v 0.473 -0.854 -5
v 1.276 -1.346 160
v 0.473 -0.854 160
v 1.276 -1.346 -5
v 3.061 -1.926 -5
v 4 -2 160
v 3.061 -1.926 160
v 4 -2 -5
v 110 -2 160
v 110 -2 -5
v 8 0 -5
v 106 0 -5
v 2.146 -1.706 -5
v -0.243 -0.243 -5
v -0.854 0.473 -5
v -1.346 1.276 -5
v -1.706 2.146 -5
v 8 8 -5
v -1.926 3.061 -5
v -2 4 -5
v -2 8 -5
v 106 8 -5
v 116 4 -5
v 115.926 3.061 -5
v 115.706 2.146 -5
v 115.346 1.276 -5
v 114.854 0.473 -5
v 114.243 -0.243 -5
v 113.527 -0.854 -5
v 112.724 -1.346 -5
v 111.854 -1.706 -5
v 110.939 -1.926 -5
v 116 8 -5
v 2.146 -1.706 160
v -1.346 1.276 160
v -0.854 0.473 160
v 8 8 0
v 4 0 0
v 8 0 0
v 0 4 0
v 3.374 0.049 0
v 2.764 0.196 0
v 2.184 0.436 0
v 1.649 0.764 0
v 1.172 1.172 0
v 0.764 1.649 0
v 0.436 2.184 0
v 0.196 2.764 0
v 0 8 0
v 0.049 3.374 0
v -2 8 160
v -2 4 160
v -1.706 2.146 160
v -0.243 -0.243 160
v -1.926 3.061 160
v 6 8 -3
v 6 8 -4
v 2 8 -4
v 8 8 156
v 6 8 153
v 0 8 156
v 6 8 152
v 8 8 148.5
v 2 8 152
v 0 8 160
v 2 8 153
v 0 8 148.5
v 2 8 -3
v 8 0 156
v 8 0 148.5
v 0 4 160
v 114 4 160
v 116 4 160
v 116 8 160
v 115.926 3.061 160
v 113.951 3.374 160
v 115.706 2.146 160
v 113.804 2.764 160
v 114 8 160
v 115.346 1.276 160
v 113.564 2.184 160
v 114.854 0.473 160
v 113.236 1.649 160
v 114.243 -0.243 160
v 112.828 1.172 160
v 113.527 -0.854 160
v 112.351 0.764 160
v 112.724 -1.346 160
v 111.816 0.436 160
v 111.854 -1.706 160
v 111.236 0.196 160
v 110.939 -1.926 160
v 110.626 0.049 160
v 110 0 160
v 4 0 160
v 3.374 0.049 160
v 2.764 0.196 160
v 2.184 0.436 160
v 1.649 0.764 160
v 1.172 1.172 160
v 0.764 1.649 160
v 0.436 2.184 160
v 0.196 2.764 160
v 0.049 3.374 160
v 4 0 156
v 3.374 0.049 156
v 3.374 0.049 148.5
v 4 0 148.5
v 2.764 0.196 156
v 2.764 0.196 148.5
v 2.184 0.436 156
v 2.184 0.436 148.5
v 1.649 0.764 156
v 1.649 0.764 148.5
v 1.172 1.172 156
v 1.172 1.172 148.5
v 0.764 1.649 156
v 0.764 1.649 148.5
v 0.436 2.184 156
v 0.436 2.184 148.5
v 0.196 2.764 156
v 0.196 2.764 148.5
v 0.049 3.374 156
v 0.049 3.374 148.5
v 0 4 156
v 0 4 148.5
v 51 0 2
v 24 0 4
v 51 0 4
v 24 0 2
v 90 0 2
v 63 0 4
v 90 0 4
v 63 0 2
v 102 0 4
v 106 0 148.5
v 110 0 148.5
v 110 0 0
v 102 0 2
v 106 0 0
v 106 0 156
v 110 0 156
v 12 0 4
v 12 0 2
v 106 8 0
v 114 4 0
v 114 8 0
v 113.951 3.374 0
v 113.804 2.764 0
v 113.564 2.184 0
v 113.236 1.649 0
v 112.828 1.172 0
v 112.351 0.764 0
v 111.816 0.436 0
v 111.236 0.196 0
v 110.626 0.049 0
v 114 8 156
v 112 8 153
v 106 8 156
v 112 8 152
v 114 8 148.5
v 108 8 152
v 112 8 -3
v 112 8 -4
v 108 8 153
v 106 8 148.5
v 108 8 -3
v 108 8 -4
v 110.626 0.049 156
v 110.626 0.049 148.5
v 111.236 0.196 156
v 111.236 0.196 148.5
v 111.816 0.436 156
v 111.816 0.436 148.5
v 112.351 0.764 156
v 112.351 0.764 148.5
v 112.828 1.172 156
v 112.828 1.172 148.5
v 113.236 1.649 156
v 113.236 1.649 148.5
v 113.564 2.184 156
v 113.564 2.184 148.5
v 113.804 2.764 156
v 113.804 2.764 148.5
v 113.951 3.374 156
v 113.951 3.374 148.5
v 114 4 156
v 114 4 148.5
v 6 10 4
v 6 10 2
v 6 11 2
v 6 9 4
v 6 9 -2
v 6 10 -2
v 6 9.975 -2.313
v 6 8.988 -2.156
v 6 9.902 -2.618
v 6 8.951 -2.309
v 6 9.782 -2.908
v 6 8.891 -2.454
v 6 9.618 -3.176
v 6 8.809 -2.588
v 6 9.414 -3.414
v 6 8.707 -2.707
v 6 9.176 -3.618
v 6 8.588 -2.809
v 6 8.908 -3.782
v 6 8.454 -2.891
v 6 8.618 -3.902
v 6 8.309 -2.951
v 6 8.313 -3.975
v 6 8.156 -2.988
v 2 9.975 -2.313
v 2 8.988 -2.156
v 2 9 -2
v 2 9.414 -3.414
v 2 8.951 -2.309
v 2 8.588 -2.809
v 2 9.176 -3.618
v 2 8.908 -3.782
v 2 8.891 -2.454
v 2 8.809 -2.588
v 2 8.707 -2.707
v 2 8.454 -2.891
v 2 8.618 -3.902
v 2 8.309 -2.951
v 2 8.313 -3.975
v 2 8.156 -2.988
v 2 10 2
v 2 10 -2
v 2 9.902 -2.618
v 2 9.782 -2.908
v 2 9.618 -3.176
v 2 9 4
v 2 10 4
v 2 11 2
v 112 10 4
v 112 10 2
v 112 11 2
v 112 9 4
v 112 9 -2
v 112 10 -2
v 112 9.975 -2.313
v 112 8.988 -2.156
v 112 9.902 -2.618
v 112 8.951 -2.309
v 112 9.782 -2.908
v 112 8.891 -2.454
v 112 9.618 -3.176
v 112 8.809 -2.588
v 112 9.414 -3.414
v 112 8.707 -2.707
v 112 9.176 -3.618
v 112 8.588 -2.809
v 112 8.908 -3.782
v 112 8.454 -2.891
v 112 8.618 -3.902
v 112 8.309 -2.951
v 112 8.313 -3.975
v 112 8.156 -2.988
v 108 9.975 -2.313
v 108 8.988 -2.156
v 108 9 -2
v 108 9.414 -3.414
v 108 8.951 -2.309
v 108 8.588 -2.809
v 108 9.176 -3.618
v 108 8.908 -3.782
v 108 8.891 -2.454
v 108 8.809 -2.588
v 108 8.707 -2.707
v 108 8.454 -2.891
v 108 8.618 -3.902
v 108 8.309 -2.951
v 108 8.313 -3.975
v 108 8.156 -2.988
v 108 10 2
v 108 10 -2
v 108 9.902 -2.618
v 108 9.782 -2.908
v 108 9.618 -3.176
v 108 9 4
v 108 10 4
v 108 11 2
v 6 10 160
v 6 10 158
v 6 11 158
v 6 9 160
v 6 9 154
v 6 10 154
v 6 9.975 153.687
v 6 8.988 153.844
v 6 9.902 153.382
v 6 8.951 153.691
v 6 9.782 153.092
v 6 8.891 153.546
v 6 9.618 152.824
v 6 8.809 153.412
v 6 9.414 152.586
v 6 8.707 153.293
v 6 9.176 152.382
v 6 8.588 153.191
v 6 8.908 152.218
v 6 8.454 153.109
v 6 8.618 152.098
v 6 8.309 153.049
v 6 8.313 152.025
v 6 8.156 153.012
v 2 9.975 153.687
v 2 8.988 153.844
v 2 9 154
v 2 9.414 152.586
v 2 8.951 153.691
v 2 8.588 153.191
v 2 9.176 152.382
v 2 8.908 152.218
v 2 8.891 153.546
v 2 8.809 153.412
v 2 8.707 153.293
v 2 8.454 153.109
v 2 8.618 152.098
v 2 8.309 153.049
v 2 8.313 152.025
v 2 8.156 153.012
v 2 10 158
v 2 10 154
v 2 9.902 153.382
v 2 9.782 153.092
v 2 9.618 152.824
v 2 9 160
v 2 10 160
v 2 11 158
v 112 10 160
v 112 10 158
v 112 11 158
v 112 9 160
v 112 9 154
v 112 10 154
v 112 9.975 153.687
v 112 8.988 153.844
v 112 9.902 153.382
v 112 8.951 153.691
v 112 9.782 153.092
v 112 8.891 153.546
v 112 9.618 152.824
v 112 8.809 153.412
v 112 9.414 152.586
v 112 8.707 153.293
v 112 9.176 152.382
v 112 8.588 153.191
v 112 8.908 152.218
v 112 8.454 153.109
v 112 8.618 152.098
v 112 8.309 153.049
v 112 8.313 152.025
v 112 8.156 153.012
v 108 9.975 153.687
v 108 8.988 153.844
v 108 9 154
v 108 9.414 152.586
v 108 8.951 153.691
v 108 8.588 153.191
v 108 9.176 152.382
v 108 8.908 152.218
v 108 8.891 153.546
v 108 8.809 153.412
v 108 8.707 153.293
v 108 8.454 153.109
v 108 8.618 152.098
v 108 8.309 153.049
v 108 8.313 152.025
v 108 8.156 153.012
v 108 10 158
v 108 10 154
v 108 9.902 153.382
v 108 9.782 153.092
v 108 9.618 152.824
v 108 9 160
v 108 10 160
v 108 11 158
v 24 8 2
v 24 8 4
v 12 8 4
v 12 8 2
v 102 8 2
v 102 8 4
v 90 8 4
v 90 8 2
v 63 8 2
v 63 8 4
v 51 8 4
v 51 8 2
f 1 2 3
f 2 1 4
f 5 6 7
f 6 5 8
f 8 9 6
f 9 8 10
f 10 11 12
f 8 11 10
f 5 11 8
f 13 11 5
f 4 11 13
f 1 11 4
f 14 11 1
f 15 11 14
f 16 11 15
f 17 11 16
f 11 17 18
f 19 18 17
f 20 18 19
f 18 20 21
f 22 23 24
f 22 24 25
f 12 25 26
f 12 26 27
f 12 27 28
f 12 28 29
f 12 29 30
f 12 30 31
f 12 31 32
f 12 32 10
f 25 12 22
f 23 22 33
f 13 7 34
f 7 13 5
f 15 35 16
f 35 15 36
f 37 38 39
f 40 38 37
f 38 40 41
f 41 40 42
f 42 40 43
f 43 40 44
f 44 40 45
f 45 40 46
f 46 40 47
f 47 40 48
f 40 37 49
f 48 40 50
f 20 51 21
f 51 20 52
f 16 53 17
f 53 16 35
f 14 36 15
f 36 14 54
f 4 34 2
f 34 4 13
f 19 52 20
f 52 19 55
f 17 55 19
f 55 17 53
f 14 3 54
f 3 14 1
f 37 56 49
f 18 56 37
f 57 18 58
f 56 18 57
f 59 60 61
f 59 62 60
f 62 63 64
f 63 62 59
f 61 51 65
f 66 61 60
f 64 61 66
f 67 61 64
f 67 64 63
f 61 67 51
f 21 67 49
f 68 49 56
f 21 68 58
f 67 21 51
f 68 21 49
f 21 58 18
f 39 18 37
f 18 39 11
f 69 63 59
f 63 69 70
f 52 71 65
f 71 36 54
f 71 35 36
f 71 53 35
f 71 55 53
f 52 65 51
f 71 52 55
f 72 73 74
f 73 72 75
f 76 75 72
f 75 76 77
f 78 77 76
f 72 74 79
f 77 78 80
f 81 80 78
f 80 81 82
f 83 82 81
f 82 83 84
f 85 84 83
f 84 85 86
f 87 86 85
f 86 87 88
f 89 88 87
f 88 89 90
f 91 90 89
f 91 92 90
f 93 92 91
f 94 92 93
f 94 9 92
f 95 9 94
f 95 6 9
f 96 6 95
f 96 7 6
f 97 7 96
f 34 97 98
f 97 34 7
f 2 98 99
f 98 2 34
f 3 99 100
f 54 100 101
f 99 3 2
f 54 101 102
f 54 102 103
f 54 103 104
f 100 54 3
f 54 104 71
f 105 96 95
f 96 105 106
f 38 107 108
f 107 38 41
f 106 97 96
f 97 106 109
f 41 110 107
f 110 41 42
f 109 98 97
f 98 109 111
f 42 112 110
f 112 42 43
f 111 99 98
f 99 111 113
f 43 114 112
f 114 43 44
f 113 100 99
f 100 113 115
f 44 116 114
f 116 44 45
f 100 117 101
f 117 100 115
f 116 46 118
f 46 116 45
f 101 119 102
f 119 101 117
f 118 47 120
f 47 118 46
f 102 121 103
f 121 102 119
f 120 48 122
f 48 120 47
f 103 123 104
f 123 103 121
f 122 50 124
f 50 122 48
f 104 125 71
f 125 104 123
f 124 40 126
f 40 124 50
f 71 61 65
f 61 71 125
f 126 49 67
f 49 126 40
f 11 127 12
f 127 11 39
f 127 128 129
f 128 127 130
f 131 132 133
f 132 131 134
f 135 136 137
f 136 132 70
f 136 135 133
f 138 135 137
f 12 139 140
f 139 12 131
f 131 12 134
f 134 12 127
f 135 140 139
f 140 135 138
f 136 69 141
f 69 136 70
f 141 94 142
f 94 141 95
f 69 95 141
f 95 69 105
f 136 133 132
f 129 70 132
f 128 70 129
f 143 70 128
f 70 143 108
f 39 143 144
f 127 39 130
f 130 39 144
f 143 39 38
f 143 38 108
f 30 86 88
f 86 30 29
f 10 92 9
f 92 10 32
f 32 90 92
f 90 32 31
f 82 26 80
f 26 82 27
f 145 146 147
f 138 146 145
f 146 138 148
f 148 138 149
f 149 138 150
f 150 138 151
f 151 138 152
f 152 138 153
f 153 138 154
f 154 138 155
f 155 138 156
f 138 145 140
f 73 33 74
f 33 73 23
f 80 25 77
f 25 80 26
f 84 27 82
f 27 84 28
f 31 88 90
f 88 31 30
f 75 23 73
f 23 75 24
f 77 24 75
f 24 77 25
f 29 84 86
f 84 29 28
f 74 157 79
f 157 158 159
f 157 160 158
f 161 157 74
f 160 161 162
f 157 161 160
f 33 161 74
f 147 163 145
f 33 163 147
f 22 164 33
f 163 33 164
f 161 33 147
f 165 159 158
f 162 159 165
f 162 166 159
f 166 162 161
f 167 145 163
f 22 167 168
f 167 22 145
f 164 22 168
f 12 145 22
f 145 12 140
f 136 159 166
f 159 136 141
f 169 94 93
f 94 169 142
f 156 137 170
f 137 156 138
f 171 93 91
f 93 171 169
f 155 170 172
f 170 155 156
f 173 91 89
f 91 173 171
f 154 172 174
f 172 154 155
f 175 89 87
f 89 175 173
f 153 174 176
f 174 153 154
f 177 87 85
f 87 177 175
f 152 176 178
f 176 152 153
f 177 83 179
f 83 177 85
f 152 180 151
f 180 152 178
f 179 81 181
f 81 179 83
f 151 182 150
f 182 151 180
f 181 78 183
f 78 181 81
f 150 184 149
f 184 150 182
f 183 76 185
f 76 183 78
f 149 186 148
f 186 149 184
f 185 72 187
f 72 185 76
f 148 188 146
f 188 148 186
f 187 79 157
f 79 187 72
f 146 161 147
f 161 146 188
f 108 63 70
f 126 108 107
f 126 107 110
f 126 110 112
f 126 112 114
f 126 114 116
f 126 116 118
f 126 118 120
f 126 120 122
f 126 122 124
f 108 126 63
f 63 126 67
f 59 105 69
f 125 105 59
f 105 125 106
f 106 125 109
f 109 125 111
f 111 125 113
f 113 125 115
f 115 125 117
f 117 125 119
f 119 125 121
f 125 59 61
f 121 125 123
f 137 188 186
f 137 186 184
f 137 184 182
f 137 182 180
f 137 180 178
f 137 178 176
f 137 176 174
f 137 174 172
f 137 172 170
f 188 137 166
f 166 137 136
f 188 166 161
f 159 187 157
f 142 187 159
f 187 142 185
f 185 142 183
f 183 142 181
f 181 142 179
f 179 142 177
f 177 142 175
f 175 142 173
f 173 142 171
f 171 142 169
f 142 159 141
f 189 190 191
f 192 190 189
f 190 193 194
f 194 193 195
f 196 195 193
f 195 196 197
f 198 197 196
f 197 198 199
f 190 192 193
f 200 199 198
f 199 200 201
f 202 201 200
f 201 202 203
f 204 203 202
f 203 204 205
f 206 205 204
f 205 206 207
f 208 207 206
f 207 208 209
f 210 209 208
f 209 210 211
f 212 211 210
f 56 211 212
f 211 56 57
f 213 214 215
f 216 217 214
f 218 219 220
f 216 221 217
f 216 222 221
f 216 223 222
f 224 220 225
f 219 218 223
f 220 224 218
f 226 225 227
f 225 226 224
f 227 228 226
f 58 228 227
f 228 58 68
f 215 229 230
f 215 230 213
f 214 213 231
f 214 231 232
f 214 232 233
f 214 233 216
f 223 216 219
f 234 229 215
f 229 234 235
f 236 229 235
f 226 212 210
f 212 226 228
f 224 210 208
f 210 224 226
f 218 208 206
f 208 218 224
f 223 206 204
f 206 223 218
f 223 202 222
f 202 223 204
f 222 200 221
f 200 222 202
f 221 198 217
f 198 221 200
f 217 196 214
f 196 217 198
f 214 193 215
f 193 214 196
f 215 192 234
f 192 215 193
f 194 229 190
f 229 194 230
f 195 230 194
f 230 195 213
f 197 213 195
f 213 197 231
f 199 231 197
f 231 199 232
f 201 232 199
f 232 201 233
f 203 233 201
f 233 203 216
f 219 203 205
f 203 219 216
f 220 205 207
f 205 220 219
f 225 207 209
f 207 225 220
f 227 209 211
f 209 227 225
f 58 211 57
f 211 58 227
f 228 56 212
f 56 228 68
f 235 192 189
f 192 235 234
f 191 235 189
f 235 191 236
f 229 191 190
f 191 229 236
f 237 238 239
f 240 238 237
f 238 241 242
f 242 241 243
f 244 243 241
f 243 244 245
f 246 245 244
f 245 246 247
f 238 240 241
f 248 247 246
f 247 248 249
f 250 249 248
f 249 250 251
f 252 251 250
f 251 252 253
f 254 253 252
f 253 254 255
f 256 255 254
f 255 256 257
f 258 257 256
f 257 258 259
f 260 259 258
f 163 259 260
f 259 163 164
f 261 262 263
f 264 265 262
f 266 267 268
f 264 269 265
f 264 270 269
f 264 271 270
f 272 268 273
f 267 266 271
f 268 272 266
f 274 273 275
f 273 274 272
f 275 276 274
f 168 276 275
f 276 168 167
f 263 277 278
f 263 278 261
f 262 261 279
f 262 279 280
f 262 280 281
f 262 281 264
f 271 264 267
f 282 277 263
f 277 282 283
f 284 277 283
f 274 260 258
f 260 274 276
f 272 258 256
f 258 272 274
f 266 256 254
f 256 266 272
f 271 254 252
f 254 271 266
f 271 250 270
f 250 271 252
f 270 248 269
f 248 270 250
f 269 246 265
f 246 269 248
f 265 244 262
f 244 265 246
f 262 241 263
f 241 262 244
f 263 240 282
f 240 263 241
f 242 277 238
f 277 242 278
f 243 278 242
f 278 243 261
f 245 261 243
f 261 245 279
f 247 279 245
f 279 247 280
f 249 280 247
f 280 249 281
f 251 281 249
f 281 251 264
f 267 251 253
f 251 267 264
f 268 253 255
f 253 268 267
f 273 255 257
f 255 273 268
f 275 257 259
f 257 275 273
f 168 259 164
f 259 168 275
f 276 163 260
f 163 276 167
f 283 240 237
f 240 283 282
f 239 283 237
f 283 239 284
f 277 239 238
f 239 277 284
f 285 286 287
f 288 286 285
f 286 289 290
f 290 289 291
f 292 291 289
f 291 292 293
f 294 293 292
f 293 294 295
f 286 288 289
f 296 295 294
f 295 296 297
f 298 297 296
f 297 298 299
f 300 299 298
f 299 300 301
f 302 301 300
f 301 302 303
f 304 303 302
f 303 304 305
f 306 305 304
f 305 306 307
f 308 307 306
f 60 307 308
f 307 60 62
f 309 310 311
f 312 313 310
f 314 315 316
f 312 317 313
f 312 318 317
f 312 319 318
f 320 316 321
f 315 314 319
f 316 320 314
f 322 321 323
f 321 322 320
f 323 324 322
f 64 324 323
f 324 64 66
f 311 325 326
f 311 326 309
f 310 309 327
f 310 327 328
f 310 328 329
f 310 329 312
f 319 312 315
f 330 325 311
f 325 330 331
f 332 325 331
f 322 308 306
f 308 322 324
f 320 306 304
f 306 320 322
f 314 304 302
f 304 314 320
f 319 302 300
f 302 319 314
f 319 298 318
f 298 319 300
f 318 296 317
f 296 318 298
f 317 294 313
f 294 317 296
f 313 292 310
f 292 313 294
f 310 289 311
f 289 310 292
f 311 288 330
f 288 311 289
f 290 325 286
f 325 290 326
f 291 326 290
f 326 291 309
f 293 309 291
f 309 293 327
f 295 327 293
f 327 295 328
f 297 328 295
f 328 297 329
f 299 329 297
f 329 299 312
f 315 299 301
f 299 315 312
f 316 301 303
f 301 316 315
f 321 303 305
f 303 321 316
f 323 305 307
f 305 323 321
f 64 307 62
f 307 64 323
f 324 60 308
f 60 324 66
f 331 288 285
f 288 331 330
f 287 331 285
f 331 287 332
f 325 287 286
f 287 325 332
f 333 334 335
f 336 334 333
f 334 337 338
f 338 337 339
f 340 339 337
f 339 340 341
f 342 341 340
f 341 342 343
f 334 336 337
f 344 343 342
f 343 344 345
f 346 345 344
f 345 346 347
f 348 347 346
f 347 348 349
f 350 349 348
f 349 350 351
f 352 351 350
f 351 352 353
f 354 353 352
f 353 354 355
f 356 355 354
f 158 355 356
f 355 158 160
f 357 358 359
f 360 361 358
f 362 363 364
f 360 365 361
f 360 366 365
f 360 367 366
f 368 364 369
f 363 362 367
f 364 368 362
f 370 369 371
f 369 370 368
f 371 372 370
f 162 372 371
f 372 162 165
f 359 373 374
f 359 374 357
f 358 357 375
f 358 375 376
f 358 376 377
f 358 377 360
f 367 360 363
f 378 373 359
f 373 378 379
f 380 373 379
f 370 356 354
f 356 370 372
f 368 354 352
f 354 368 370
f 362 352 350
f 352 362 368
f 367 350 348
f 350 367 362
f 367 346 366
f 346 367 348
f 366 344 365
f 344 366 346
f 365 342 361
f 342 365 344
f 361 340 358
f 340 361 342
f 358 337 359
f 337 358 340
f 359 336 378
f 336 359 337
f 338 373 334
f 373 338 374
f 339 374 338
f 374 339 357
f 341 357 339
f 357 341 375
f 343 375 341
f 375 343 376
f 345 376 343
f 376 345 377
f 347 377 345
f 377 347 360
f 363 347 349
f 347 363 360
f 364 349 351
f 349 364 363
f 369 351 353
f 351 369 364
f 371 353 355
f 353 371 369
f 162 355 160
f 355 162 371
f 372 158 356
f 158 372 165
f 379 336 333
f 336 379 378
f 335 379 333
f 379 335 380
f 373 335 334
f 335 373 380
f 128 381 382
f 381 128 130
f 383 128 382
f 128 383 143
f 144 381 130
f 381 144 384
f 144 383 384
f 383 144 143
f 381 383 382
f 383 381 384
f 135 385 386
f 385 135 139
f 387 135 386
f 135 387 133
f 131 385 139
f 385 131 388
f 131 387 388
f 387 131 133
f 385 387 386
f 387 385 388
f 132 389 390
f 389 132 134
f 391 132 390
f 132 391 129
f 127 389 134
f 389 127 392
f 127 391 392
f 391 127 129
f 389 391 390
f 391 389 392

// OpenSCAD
$fn=40;
front_panel();
//corner(solid=false);

module front_panel(box_width=114, box_depth=220, box_height=160, t=2, r=4)
{
    // Global parameters
    stand_h = 5;
    bottom_lock_w = 12;
    
    // Bottom stands
    translate([r,r,-stand_h]) {
        corner(h=stand_h);
        corner(h=stand_h+box_height,solid=false);
    }
    translate([box_width-r,r,-stand_h]) mirror([1,0,0]) {
        corner(h=stand_h);
        corner(h=stand_h+box_height,solid=false);
    }

    // Bottom locks
    translate([3*r,0,t]) cube([bottom_lock_w, 2*r, t]);
    translate([box_width-bottom_lock_w-3*r,0,t]) cube([bottom_lock_w, 2*r, t]);
    translate([(box_width-bottom_lock_w)/2,0,t]) cube([bottom_lock_w, 2*r, t]);


    // Top blocks
    translate([r,r,box_height-2*t-1.5*stand_h]) corner(h=1.5*stand_h);
    translate([box_width-r,r,box_height-2*t-1.5*stand_h])mirror([1,0,0]) corner(h=1.5*stand_h);
    translate([r,-t,-stand_h])cube([box_width-2*r,t,box_height+stand_h]);
    
    // Snap-in
    snap_h = 8;
    translate([r,2*r,-snap_h+2*t]) snap_in(h=snap_h);
    translate([box_width-r,2*r,-snap_h+2*t]) snap_in(h=snap_h);
    translate([r,2*r,box_height-snap_h]) snap_in(h=snap_h);
    translate([box_width-r,2*r,box_height-snap_h]) snap_in(h=snap_h);

}

module corner(r=4, h=8, t=2, solid=true)
{
    r = r+t;
    difference() {
        if(solid) {
            linear_extrude(height=h){
                union() {
                    circle(r=r);
                    translate([-r,0,0])square([2*r,r]);
                    translate([0,-r,0])square([r,2*r]);
                }
            }
        }
        else {
            linear_extrude(height=h) difference(){
                union() {
                    circle(r=r);
                    translate([-r,0,0])square([2*r,r]);
                    translate([0,-r,0])square([r,2*r]);
                }
                circle(r=r-t);
                translate([-r+t,0,0])square([2*r,r]);
                translate([0,-r+t,0])square([r,2*r]);
            }
        }
        
        translate([-2*r,r-t,-t])cube([4*r,2*t,h+2*t]);
        translate([r-t,-2*r,-t])cube([2*t,4*r,h+2*t]);
    }
}

module snap_in(h=8, w=4, t=2)
{
    translate([-w/2,0,0]) union() {
        translate([w,0,t])rotate([0,-90,0]) linear_extrude(height=w) difference(){
            union() {
                circle(r=t);
                square([t,t]);
            }
            translate([-t,-t]) square([2*t,t]);
            circle(r=t/2);
            square([t/2,t/2]);
            translate([0,-t/2]) square([2*t,t]);
        }
        translate([0,t/2,t]) cube([w,t/2,h-t]); 
        translate([0,t/2,h-t]) linear_extrude(scale=[1,0.5],height=t) #square([w,t]);
    }
}
